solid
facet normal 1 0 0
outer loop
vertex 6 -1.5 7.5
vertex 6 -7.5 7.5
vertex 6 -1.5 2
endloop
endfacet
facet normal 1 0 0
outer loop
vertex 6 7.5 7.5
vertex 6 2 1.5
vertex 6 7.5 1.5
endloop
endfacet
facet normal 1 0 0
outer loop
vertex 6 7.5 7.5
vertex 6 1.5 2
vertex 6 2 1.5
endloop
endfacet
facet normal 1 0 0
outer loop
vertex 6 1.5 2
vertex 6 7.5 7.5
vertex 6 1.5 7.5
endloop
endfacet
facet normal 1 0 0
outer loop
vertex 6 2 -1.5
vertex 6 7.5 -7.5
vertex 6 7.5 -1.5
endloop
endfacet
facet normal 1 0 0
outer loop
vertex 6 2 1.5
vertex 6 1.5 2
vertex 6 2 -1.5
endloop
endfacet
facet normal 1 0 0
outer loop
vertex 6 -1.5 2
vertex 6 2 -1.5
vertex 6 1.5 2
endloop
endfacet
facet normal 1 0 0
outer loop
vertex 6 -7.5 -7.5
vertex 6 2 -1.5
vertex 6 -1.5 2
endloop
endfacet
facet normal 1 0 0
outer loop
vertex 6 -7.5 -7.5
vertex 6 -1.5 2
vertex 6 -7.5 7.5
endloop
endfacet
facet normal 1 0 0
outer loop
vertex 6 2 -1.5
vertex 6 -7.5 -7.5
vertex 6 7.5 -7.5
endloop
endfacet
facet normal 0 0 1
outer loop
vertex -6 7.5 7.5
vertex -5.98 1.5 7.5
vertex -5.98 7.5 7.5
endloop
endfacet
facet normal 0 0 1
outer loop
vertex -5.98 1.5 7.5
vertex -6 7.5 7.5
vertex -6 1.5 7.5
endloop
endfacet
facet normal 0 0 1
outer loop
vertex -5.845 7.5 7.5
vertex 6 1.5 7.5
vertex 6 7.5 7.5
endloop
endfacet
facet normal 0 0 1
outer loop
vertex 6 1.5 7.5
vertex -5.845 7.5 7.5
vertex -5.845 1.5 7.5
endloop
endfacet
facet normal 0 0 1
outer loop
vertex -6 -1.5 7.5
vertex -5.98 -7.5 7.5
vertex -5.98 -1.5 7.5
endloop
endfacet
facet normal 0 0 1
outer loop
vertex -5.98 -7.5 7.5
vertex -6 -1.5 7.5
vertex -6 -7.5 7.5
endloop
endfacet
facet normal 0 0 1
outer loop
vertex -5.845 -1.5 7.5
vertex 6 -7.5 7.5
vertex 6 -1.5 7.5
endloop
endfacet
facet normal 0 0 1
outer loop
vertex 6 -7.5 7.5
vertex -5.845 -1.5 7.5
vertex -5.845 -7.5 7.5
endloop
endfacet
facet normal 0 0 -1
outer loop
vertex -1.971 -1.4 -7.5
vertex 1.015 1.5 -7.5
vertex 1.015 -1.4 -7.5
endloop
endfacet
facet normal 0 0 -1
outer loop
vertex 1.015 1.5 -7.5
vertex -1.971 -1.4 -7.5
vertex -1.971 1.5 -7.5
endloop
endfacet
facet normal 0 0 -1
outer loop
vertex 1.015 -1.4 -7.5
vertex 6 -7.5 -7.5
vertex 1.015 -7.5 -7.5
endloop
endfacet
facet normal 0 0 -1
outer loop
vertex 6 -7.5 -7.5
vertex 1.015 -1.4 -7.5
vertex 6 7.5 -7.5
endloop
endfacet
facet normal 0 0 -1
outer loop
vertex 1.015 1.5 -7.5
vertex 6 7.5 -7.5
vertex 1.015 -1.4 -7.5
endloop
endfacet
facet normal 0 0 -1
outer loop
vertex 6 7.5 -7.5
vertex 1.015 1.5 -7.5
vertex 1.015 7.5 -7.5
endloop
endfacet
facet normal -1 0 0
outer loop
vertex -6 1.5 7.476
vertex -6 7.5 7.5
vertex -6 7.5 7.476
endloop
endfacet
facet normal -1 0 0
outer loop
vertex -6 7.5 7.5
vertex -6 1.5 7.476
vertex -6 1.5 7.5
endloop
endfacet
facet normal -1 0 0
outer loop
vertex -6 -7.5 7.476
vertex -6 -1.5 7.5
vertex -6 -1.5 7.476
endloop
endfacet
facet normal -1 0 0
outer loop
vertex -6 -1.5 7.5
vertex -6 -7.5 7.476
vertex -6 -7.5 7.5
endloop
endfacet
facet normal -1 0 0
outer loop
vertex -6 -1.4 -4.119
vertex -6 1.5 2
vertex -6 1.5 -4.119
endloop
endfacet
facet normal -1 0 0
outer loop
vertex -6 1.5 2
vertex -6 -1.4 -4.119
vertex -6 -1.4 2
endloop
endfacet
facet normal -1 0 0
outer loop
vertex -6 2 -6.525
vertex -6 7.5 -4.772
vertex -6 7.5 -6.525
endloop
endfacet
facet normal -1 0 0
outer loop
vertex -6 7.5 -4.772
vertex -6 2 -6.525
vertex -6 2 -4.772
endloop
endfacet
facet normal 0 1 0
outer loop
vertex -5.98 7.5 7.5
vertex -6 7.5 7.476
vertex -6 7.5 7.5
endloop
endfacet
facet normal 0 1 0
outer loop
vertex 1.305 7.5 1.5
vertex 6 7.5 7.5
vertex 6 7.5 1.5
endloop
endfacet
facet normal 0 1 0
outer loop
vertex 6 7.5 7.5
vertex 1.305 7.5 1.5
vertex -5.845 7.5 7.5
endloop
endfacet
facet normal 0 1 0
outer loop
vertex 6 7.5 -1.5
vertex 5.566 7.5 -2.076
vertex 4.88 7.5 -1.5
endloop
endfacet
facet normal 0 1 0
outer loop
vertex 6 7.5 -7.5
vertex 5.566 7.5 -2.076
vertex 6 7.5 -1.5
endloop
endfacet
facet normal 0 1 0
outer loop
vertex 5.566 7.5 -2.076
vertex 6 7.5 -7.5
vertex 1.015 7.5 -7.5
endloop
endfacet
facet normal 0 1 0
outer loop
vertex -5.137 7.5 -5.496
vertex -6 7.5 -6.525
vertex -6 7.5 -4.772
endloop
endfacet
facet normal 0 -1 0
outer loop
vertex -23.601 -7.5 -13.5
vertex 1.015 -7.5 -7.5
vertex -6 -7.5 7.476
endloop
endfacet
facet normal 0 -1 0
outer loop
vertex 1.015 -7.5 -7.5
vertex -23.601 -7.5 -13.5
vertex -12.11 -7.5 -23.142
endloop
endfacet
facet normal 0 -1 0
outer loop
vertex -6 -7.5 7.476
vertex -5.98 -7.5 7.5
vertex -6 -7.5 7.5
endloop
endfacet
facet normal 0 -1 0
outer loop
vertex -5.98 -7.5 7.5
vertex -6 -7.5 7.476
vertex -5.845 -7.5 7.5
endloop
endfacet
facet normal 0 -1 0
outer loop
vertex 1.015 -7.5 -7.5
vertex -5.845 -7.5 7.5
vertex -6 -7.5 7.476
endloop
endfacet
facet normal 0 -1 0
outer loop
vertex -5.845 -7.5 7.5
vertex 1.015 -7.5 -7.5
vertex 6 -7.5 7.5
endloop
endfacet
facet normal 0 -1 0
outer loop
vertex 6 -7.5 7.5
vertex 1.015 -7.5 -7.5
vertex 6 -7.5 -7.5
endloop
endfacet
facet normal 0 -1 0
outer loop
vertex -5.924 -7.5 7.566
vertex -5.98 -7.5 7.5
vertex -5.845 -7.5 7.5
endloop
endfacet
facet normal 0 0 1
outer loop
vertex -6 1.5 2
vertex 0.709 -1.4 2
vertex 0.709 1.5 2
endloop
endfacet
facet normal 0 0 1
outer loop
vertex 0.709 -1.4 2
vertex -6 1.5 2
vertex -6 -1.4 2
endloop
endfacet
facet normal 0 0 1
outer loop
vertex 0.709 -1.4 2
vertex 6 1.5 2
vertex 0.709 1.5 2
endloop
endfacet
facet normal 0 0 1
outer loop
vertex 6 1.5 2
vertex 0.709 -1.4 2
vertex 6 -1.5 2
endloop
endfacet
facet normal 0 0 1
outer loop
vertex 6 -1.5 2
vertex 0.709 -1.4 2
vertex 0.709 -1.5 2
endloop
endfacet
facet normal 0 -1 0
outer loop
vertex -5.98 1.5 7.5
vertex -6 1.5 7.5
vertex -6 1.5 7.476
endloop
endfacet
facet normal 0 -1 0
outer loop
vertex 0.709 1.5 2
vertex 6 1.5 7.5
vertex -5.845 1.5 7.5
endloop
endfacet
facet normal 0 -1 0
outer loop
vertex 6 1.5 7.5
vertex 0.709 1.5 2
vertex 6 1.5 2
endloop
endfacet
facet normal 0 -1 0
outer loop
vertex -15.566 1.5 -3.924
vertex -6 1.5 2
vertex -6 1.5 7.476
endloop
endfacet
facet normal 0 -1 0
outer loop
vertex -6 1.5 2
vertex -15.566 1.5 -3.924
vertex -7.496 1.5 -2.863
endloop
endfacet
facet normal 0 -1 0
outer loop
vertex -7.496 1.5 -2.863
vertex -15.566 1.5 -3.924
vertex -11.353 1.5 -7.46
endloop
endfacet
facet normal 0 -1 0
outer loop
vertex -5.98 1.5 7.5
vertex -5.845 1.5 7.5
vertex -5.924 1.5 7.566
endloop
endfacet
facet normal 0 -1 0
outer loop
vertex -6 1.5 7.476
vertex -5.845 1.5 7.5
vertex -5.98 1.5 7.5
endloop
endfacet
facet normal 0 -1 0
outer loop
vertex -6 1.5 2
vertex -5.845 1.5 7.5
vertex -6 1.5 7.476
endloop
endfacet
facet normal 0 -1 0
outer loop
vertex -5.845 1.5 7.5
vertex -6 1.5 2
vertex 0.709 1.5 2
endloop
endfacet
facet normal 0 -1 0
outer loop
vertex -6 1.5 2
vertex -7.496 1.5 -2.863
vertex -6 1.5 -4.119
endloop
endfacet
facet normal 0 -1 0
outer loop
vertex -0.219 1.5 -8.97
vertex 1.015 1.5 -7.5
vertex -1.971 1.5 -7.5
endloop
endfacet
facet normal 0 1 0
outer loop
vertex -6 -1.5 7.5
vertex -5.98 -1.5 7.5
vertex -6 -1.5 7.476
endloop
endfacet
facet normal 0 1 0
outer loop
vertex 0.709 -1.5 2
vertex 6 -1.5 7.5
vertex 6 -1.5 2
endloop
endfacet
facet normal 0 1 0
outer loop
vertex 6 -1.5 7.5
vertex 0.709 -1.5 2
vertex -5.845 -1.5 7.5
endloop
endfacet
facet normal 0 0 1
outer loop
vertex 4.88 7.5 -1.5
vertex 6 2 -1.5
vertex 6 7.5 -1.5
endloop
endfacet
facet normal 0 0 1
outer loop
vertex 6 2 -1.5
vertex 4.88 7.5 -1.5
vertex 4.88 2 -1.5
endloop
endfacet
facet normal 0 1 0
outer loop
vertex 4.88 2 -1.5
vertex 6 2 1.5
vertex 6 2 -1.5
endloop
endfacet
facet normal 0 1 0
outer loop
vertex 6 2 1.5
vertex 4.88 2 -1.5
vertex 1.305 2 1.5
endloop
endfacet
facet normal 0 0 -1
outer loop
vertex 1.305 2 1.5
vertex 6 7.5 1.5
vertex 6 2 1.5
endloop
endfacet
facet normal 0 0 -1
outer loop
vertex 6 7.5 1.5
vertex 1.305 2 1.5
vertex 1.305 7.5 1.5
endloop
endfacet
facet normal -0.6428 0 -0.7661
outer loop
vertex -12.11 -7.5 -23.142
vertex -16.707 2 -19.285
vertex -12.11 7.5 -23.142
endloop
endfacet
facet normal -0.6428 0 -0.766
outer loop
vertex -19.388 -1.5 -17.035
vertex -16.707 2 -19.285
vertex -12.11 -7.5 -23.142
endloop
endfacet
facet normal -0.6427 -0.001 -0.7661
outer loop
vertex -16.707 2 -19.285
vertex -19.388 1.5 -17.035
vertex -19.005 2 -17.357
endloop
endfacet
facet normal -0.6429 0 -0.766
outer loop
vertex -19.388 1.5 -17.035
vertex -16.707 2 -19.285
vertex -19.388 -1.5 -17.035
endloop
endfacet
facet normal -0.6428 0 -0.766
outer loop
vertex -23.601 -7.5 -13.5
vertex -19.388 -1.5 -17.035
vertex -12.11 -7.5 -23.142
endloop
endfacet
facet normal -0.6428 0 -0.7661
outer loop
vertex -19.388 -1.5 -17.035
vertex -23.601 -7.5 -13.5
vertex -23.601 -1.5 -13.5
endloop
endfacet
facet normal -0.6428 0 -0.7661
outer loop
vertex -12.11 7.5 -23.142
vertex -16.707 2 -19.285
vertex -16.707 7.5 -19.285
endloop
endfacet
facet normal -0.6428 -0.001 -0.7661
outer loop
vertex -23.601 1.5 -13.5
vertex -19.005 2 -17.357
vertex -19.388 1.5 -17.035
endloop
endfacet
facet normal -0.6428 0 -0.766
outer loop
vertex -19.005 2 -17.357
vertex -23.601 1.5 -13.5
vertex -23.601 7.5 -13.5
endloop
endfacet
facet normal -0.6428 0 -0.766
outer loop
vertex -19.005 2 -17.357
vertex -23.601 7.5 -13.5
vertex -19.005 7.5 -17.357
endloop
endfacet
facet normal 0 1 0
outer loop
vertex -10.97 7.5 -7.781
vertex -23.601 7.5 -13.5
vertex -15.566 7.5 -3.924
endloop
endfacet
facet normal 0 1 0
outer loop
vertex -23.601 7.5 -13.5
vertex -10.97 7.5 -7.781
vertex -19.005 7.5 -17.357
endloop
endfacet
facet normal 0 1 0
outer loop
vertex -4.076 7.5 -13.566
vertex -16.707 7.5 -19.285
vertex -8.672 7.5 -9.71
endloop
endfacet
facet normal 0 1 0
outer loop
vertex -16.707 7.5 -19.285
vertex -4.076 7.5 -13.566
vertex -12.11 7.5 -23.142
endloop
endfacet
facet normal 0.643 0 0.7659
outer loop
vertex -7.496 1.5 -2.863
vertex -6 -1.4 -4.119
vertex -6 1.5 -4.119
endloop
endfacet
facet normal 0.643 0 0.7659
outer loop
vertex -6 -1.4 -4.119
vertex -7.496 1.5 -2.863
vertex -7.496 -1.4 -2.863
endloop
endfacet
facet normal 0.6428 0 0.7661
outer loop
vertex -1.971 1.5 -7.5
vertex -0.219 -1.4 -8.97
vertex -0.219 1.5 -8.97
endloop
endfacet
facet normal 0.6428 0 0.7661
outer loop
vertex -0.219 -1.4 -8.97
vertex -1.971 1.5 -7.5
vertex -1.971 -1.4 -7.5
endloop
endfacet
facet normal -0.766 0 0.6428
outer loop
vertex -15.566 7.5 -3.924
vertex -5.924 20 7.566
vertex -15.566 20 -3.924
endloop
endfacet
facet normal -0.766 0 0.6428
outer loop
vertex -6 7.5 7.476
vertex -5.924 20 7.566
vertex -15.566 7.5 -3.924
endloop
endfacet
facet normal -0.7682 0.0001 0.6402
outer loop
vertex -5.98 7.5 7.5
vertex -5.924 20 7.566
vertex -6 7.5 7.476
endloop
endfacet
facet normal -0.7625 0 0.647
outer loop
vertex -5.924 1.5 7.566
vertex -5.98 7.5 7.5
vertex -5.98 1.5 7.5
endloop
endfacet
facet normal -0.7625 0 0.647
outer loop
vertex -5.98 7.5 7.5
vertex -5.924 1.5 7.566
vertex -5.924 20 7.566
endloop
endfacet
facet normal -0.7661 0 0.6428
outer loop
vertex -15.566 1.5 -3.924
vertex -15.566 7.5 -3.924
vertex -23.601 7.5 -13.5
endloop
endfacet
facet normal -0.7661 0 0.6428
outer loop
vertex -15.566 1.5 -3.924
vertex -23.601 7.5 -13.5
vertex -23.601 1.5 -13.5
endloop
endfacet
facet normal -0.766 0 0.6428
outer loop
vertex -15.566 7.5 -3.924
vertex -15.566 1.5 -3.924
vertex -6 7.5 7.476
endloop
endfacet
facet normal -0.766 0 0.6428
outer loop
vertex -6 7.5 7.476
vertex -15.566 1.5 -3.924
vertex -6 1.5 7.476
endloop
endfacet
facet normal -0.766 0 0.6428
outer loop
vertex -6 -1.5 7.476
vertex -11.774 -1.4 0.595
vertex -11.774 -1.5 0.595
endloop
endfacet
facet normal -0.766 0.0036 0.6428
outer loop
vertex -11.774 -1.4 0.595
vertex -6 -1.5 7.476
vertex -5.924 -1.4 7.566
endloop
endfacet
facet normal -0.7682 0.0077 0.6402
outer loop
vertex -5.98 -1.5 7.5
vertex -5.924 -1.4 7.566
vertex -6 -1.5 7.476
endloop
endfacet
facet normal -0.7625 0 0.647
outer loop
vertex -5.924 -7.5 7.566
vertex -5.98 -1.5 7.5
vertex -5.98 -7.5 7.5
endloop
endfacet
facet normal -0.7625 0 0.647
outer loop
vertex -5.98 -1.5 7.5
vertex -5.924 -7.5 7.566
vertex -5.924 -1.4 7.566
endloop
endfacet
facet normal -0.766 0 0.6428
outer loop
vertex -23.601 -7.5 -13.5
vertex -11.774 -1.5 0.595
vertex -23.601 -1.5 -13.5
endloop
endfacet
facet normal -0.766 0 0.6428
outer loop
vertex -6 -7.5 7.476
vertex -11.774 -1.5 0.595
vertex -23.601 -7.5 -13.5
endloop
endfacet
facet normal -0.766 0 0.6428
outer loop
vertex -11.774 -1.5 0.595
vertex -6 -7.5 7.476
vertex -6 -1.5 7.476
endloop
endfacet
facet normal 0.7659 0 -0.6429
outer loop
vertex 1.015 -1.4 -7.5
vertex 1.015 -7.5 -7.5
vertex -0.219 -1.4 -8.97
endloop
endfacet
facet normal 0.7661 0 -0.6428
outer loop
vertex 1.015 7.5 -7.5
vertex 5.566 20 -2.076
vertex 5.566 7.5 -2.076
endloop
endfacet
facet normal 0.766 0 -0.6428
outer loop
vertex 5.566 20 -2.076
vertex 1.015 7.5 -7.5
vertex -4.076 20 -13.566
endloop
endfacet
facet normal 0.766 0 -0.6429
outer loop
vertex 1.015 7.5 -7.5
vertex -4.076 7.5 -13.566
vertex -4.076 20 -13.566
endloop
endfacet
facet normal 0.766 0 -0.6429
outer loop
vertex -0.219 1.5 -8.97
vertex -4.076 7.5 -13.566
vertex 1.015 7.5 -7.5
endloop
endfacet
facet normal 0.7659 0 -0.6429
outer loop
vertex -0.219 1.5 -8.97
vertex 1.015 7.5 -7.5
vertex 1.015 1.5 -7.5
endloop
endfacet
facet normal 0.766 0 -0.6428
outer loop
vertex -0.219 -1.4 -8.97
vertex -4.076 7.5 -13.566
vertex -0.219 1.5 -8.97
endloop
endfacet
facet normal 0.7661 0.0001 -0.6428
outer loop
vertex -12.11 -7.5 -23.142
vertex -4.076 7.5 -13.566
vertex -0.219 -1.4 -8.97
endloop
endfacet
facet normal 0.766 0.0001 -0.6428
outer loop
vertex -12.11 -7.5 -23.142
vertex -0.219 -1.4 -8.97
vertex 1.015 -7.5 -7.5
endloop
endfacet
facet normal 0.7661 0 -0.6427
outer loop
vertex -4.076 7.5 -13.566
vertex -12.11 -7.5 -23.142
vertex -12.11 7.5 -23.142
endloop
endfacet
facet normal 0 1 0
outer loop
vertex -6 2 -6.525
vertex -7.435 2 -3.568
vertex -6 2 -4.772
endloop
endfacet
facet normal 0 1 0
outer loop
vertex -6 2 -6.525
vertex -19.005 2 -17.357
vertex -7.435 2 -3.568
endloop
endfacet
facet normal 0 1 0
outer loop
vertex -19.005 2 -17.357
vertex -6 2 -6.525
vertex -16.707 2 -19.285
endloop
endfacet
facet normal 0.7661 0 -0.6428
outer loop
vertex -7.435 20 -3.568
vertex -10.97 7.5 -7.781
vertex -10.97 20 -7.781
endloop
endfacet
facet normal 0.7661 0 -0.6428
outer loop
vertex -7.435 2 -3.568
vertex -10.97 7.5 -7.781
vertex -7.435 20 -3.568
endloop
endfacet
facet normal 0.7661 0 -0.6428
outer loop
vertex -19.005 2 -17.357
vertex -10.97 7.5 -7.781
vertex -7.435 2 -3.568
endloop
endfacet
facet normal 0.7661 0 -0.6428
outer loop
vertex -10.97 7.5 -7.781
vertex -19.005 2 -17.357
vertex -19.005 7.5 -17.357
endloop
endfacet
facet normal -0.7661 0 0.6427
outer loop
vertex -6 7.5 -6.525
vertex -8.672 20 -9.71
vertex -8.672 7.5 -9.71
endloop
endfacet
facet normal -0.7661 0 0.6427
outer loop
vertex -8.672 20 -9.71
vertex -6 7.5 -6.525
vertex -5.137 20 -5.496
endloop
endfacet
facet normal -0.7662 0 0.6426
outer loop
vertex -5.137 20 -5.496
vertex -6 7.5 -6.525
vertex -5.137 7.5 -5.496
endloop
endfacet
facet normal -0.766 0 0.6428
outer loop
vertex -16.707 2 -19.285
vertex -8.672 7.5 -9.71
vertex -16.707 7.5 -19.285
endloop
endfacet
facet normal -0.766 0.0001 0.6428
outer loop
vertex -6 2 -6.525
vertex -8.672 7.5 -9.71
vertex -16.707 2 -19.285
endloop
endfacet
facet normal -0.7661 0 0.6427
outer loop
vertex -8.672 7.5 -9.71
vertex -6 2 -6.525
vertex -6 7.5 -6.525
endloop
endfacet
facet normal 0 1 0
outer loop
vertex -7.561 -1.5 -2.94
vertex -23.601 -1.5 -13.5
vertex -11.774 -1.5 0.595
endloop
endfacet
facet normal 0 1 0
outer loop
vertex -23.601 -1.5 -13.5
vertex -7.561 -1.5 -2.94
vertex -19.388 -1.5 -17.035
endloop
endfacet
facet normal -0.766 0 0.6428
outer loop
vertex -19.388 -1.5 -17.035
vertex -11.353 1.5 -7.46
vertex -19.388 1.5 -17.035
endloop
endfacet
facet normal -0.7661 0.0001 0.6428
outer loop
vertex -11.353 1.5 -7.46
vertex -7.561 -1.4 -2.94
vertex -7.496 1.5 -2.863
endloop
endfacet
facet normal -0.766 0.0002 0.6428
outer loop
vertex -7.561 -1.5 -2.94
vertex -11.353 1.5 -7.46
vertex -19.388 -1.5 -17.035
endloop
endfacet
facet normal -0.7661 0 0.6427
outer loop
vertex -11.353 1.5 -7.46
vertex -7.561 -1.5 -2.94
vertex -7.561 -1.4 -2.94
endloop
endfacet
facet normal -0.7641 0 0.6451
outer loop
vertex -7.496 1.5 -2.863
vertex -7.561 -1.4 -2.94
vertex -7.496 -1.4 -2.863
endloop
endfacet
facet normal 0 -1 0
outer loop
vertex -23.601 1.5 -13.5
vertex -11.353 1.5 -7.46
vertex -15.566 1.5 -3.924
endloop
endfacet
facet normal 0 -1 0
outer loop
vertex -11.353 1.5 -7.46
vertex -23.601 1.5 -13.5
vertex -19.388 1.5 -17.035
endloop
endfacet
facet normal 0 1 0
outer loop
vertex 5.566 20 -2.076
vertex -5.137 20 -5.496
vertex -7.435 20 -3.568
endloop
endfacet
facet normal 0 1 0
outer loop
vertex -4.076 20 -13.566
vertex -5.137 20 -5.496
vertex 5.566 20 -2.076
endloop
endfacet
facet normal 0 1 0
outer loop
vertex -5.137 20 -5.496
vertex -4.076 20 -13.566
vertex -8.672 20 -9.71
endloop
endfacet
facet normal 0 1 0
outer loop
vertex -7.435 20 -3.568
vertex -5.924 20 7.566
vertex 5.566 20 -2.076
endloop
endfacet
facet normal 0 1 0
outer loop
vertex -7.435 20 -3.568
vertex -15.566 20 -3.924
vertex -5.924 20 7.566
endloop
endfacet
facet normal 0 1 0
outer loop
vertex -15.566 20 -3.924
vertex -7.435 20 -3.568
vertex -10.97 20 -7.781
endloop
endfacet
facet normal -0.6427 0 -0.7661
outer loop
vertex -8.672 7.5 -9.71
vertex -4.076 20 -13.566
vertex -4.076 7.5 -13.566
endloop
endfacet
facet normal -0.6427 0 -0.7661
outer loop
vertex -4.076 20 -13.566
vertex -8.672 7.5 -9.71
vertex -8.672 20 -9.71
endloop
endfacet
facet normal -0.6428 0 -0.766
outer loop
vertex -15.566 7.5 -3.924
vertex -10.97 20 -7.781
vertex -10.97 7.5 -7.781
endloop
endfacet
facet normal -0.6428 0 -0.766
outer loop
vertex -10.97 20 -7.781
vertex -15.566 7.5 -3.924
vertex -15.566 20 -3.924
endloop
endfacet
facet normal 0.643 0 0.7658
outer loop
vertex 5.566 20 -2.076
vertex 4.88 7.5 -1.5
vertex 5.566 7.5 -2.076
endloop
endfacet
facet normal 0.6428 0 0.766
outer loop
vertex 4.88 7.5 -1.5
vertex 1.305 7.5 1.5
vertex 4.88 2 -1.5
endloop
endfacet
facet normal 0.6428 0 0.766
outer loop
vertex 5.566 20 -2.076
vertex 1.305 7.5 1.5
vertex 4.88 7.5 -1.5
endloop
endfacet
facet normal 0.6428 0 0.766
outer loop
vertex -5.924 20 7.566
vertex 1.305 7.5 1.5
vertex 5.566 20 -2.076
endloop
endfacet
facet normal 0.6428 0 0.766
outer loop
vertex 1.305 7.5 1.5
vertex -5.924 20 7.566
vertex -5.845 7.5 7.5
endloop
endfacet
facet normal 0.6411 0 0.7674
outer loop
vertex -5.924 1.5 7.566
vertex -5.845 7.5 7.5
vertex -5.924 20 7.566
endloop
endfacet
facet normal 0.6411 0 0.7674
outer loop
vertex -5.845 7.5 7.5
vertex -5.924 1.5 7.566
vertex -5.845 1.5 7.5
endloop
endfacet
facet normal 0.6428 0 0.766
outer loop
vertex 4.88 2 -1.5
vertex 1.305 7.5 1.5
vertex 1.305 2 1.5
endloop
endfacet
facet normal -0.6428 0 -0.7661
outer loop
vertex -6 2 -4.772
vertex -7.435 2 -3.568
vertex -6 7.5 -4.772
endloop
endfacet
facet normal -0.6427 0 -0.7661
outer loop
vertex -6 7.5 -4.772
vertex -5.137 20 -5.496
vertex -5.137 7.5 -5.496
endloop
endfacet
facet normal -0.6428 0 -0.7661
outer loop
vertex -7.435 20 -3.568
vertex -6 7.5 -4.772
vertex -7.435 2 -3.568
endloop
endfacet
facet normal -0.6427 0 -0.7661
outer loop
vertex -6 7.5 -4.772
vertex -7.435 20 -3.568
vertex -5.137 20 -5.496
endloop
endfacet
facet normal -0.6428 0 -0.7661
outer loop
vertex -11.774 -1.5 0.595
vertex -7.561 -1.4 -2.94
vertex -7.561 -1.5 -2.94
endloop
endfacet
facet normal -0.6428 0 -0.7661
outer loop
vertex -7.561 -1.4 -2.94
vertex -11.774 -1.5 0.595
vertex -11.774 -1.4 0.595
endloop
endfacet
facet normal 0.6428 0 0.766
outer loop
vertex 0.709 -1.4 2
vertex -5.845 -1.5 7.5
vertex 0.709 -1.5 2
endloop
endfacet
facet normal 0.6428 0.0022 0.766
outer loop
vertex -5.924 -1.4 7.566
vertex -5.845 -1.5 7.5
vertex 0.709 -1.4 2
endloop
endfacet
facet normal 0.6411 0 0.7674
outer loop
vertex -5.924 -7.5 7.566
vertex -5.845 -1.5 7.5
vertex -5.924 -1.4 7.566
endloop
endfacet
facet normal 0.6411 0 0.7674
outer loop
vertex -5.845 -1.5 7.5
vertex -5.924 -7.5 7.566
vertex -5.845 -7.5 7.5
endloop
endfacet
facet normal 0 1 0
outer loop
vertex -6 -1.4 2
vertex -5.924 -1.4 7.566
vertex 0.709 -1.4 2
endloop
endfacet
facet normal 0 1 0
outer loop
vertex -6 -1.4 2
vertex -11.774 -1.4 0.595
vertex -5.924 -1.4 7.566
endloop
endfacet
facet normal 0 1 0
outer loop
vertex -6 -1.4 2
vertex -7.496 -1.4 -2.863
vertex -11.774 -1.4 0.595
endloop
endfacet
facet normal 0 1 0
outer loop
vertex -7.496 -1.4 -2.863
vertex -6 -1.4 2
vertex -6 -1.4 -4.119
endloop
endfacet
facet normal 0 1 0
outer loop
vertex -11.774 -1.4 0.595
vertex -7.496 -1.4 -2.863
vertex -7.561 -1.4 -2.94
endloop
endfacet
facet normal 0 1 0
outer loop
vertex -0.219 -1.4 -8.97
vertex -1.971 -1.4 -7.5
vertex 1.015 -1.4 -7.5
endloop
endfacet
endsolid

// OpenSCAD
union()
{
  difference()
  {
    difference()
    {
      cube(size = [12, 15, 15], center = true);
      translate(v = [0, 0, 5.5])
      {
        cube(size = [13, 3, 7], center = true);
      }
    }
    rotate(a = [-90, 0, 0], v = undef)
    {
      translate(v = [0, 0, 5.5])
      {
        cube(size = [13, 3, 7], center = true);
      }
    }
  }
  translate(v = [-5, 0, -3])
  {
    rotate(a = [0, 130, 0], v = undef)
    {
      union()
      {
        rotate(a = [-90, 0, 0], v = undef)
        {
          translate(v = [10.75, 0, 0])
          {
            difference()
            {
              difference()
              {
                cube(size = [18.5, 15, 15], center = true);
                translate(v = [0, 0, 5.5])
                {
                  cube(size = [19.5, 3, 7], center = true);
                }
              }
              rotate(a = [-90, 0, 0], v = undef)
              {
                translate(v = [-5, 0, 5.5])
                {
                  cube(size = [28.5, 3, 7], center = true);
                }
              }
            }
          }
        }
        rotate(a = [0, 90, 0], v = undef)
        {
          translate(v = [0, 10.75, 0])
          {
            rotate(a = [0, 0, 90], v = undef)
            {
              difference()
              {
                cube(size = [18.5, 15, 15], center = true);
                translate(v = [0, 0, 5.5])
                {
                  cube(size = [19.5, 3, 7], center = true);
                }
              }
            }
          }
        }
        translate(v = [-2.95, -4.45, 0])
        {
          cube(size = [9.1, 6.1, 15], center = true);
        }
      }
    }
  }
}
